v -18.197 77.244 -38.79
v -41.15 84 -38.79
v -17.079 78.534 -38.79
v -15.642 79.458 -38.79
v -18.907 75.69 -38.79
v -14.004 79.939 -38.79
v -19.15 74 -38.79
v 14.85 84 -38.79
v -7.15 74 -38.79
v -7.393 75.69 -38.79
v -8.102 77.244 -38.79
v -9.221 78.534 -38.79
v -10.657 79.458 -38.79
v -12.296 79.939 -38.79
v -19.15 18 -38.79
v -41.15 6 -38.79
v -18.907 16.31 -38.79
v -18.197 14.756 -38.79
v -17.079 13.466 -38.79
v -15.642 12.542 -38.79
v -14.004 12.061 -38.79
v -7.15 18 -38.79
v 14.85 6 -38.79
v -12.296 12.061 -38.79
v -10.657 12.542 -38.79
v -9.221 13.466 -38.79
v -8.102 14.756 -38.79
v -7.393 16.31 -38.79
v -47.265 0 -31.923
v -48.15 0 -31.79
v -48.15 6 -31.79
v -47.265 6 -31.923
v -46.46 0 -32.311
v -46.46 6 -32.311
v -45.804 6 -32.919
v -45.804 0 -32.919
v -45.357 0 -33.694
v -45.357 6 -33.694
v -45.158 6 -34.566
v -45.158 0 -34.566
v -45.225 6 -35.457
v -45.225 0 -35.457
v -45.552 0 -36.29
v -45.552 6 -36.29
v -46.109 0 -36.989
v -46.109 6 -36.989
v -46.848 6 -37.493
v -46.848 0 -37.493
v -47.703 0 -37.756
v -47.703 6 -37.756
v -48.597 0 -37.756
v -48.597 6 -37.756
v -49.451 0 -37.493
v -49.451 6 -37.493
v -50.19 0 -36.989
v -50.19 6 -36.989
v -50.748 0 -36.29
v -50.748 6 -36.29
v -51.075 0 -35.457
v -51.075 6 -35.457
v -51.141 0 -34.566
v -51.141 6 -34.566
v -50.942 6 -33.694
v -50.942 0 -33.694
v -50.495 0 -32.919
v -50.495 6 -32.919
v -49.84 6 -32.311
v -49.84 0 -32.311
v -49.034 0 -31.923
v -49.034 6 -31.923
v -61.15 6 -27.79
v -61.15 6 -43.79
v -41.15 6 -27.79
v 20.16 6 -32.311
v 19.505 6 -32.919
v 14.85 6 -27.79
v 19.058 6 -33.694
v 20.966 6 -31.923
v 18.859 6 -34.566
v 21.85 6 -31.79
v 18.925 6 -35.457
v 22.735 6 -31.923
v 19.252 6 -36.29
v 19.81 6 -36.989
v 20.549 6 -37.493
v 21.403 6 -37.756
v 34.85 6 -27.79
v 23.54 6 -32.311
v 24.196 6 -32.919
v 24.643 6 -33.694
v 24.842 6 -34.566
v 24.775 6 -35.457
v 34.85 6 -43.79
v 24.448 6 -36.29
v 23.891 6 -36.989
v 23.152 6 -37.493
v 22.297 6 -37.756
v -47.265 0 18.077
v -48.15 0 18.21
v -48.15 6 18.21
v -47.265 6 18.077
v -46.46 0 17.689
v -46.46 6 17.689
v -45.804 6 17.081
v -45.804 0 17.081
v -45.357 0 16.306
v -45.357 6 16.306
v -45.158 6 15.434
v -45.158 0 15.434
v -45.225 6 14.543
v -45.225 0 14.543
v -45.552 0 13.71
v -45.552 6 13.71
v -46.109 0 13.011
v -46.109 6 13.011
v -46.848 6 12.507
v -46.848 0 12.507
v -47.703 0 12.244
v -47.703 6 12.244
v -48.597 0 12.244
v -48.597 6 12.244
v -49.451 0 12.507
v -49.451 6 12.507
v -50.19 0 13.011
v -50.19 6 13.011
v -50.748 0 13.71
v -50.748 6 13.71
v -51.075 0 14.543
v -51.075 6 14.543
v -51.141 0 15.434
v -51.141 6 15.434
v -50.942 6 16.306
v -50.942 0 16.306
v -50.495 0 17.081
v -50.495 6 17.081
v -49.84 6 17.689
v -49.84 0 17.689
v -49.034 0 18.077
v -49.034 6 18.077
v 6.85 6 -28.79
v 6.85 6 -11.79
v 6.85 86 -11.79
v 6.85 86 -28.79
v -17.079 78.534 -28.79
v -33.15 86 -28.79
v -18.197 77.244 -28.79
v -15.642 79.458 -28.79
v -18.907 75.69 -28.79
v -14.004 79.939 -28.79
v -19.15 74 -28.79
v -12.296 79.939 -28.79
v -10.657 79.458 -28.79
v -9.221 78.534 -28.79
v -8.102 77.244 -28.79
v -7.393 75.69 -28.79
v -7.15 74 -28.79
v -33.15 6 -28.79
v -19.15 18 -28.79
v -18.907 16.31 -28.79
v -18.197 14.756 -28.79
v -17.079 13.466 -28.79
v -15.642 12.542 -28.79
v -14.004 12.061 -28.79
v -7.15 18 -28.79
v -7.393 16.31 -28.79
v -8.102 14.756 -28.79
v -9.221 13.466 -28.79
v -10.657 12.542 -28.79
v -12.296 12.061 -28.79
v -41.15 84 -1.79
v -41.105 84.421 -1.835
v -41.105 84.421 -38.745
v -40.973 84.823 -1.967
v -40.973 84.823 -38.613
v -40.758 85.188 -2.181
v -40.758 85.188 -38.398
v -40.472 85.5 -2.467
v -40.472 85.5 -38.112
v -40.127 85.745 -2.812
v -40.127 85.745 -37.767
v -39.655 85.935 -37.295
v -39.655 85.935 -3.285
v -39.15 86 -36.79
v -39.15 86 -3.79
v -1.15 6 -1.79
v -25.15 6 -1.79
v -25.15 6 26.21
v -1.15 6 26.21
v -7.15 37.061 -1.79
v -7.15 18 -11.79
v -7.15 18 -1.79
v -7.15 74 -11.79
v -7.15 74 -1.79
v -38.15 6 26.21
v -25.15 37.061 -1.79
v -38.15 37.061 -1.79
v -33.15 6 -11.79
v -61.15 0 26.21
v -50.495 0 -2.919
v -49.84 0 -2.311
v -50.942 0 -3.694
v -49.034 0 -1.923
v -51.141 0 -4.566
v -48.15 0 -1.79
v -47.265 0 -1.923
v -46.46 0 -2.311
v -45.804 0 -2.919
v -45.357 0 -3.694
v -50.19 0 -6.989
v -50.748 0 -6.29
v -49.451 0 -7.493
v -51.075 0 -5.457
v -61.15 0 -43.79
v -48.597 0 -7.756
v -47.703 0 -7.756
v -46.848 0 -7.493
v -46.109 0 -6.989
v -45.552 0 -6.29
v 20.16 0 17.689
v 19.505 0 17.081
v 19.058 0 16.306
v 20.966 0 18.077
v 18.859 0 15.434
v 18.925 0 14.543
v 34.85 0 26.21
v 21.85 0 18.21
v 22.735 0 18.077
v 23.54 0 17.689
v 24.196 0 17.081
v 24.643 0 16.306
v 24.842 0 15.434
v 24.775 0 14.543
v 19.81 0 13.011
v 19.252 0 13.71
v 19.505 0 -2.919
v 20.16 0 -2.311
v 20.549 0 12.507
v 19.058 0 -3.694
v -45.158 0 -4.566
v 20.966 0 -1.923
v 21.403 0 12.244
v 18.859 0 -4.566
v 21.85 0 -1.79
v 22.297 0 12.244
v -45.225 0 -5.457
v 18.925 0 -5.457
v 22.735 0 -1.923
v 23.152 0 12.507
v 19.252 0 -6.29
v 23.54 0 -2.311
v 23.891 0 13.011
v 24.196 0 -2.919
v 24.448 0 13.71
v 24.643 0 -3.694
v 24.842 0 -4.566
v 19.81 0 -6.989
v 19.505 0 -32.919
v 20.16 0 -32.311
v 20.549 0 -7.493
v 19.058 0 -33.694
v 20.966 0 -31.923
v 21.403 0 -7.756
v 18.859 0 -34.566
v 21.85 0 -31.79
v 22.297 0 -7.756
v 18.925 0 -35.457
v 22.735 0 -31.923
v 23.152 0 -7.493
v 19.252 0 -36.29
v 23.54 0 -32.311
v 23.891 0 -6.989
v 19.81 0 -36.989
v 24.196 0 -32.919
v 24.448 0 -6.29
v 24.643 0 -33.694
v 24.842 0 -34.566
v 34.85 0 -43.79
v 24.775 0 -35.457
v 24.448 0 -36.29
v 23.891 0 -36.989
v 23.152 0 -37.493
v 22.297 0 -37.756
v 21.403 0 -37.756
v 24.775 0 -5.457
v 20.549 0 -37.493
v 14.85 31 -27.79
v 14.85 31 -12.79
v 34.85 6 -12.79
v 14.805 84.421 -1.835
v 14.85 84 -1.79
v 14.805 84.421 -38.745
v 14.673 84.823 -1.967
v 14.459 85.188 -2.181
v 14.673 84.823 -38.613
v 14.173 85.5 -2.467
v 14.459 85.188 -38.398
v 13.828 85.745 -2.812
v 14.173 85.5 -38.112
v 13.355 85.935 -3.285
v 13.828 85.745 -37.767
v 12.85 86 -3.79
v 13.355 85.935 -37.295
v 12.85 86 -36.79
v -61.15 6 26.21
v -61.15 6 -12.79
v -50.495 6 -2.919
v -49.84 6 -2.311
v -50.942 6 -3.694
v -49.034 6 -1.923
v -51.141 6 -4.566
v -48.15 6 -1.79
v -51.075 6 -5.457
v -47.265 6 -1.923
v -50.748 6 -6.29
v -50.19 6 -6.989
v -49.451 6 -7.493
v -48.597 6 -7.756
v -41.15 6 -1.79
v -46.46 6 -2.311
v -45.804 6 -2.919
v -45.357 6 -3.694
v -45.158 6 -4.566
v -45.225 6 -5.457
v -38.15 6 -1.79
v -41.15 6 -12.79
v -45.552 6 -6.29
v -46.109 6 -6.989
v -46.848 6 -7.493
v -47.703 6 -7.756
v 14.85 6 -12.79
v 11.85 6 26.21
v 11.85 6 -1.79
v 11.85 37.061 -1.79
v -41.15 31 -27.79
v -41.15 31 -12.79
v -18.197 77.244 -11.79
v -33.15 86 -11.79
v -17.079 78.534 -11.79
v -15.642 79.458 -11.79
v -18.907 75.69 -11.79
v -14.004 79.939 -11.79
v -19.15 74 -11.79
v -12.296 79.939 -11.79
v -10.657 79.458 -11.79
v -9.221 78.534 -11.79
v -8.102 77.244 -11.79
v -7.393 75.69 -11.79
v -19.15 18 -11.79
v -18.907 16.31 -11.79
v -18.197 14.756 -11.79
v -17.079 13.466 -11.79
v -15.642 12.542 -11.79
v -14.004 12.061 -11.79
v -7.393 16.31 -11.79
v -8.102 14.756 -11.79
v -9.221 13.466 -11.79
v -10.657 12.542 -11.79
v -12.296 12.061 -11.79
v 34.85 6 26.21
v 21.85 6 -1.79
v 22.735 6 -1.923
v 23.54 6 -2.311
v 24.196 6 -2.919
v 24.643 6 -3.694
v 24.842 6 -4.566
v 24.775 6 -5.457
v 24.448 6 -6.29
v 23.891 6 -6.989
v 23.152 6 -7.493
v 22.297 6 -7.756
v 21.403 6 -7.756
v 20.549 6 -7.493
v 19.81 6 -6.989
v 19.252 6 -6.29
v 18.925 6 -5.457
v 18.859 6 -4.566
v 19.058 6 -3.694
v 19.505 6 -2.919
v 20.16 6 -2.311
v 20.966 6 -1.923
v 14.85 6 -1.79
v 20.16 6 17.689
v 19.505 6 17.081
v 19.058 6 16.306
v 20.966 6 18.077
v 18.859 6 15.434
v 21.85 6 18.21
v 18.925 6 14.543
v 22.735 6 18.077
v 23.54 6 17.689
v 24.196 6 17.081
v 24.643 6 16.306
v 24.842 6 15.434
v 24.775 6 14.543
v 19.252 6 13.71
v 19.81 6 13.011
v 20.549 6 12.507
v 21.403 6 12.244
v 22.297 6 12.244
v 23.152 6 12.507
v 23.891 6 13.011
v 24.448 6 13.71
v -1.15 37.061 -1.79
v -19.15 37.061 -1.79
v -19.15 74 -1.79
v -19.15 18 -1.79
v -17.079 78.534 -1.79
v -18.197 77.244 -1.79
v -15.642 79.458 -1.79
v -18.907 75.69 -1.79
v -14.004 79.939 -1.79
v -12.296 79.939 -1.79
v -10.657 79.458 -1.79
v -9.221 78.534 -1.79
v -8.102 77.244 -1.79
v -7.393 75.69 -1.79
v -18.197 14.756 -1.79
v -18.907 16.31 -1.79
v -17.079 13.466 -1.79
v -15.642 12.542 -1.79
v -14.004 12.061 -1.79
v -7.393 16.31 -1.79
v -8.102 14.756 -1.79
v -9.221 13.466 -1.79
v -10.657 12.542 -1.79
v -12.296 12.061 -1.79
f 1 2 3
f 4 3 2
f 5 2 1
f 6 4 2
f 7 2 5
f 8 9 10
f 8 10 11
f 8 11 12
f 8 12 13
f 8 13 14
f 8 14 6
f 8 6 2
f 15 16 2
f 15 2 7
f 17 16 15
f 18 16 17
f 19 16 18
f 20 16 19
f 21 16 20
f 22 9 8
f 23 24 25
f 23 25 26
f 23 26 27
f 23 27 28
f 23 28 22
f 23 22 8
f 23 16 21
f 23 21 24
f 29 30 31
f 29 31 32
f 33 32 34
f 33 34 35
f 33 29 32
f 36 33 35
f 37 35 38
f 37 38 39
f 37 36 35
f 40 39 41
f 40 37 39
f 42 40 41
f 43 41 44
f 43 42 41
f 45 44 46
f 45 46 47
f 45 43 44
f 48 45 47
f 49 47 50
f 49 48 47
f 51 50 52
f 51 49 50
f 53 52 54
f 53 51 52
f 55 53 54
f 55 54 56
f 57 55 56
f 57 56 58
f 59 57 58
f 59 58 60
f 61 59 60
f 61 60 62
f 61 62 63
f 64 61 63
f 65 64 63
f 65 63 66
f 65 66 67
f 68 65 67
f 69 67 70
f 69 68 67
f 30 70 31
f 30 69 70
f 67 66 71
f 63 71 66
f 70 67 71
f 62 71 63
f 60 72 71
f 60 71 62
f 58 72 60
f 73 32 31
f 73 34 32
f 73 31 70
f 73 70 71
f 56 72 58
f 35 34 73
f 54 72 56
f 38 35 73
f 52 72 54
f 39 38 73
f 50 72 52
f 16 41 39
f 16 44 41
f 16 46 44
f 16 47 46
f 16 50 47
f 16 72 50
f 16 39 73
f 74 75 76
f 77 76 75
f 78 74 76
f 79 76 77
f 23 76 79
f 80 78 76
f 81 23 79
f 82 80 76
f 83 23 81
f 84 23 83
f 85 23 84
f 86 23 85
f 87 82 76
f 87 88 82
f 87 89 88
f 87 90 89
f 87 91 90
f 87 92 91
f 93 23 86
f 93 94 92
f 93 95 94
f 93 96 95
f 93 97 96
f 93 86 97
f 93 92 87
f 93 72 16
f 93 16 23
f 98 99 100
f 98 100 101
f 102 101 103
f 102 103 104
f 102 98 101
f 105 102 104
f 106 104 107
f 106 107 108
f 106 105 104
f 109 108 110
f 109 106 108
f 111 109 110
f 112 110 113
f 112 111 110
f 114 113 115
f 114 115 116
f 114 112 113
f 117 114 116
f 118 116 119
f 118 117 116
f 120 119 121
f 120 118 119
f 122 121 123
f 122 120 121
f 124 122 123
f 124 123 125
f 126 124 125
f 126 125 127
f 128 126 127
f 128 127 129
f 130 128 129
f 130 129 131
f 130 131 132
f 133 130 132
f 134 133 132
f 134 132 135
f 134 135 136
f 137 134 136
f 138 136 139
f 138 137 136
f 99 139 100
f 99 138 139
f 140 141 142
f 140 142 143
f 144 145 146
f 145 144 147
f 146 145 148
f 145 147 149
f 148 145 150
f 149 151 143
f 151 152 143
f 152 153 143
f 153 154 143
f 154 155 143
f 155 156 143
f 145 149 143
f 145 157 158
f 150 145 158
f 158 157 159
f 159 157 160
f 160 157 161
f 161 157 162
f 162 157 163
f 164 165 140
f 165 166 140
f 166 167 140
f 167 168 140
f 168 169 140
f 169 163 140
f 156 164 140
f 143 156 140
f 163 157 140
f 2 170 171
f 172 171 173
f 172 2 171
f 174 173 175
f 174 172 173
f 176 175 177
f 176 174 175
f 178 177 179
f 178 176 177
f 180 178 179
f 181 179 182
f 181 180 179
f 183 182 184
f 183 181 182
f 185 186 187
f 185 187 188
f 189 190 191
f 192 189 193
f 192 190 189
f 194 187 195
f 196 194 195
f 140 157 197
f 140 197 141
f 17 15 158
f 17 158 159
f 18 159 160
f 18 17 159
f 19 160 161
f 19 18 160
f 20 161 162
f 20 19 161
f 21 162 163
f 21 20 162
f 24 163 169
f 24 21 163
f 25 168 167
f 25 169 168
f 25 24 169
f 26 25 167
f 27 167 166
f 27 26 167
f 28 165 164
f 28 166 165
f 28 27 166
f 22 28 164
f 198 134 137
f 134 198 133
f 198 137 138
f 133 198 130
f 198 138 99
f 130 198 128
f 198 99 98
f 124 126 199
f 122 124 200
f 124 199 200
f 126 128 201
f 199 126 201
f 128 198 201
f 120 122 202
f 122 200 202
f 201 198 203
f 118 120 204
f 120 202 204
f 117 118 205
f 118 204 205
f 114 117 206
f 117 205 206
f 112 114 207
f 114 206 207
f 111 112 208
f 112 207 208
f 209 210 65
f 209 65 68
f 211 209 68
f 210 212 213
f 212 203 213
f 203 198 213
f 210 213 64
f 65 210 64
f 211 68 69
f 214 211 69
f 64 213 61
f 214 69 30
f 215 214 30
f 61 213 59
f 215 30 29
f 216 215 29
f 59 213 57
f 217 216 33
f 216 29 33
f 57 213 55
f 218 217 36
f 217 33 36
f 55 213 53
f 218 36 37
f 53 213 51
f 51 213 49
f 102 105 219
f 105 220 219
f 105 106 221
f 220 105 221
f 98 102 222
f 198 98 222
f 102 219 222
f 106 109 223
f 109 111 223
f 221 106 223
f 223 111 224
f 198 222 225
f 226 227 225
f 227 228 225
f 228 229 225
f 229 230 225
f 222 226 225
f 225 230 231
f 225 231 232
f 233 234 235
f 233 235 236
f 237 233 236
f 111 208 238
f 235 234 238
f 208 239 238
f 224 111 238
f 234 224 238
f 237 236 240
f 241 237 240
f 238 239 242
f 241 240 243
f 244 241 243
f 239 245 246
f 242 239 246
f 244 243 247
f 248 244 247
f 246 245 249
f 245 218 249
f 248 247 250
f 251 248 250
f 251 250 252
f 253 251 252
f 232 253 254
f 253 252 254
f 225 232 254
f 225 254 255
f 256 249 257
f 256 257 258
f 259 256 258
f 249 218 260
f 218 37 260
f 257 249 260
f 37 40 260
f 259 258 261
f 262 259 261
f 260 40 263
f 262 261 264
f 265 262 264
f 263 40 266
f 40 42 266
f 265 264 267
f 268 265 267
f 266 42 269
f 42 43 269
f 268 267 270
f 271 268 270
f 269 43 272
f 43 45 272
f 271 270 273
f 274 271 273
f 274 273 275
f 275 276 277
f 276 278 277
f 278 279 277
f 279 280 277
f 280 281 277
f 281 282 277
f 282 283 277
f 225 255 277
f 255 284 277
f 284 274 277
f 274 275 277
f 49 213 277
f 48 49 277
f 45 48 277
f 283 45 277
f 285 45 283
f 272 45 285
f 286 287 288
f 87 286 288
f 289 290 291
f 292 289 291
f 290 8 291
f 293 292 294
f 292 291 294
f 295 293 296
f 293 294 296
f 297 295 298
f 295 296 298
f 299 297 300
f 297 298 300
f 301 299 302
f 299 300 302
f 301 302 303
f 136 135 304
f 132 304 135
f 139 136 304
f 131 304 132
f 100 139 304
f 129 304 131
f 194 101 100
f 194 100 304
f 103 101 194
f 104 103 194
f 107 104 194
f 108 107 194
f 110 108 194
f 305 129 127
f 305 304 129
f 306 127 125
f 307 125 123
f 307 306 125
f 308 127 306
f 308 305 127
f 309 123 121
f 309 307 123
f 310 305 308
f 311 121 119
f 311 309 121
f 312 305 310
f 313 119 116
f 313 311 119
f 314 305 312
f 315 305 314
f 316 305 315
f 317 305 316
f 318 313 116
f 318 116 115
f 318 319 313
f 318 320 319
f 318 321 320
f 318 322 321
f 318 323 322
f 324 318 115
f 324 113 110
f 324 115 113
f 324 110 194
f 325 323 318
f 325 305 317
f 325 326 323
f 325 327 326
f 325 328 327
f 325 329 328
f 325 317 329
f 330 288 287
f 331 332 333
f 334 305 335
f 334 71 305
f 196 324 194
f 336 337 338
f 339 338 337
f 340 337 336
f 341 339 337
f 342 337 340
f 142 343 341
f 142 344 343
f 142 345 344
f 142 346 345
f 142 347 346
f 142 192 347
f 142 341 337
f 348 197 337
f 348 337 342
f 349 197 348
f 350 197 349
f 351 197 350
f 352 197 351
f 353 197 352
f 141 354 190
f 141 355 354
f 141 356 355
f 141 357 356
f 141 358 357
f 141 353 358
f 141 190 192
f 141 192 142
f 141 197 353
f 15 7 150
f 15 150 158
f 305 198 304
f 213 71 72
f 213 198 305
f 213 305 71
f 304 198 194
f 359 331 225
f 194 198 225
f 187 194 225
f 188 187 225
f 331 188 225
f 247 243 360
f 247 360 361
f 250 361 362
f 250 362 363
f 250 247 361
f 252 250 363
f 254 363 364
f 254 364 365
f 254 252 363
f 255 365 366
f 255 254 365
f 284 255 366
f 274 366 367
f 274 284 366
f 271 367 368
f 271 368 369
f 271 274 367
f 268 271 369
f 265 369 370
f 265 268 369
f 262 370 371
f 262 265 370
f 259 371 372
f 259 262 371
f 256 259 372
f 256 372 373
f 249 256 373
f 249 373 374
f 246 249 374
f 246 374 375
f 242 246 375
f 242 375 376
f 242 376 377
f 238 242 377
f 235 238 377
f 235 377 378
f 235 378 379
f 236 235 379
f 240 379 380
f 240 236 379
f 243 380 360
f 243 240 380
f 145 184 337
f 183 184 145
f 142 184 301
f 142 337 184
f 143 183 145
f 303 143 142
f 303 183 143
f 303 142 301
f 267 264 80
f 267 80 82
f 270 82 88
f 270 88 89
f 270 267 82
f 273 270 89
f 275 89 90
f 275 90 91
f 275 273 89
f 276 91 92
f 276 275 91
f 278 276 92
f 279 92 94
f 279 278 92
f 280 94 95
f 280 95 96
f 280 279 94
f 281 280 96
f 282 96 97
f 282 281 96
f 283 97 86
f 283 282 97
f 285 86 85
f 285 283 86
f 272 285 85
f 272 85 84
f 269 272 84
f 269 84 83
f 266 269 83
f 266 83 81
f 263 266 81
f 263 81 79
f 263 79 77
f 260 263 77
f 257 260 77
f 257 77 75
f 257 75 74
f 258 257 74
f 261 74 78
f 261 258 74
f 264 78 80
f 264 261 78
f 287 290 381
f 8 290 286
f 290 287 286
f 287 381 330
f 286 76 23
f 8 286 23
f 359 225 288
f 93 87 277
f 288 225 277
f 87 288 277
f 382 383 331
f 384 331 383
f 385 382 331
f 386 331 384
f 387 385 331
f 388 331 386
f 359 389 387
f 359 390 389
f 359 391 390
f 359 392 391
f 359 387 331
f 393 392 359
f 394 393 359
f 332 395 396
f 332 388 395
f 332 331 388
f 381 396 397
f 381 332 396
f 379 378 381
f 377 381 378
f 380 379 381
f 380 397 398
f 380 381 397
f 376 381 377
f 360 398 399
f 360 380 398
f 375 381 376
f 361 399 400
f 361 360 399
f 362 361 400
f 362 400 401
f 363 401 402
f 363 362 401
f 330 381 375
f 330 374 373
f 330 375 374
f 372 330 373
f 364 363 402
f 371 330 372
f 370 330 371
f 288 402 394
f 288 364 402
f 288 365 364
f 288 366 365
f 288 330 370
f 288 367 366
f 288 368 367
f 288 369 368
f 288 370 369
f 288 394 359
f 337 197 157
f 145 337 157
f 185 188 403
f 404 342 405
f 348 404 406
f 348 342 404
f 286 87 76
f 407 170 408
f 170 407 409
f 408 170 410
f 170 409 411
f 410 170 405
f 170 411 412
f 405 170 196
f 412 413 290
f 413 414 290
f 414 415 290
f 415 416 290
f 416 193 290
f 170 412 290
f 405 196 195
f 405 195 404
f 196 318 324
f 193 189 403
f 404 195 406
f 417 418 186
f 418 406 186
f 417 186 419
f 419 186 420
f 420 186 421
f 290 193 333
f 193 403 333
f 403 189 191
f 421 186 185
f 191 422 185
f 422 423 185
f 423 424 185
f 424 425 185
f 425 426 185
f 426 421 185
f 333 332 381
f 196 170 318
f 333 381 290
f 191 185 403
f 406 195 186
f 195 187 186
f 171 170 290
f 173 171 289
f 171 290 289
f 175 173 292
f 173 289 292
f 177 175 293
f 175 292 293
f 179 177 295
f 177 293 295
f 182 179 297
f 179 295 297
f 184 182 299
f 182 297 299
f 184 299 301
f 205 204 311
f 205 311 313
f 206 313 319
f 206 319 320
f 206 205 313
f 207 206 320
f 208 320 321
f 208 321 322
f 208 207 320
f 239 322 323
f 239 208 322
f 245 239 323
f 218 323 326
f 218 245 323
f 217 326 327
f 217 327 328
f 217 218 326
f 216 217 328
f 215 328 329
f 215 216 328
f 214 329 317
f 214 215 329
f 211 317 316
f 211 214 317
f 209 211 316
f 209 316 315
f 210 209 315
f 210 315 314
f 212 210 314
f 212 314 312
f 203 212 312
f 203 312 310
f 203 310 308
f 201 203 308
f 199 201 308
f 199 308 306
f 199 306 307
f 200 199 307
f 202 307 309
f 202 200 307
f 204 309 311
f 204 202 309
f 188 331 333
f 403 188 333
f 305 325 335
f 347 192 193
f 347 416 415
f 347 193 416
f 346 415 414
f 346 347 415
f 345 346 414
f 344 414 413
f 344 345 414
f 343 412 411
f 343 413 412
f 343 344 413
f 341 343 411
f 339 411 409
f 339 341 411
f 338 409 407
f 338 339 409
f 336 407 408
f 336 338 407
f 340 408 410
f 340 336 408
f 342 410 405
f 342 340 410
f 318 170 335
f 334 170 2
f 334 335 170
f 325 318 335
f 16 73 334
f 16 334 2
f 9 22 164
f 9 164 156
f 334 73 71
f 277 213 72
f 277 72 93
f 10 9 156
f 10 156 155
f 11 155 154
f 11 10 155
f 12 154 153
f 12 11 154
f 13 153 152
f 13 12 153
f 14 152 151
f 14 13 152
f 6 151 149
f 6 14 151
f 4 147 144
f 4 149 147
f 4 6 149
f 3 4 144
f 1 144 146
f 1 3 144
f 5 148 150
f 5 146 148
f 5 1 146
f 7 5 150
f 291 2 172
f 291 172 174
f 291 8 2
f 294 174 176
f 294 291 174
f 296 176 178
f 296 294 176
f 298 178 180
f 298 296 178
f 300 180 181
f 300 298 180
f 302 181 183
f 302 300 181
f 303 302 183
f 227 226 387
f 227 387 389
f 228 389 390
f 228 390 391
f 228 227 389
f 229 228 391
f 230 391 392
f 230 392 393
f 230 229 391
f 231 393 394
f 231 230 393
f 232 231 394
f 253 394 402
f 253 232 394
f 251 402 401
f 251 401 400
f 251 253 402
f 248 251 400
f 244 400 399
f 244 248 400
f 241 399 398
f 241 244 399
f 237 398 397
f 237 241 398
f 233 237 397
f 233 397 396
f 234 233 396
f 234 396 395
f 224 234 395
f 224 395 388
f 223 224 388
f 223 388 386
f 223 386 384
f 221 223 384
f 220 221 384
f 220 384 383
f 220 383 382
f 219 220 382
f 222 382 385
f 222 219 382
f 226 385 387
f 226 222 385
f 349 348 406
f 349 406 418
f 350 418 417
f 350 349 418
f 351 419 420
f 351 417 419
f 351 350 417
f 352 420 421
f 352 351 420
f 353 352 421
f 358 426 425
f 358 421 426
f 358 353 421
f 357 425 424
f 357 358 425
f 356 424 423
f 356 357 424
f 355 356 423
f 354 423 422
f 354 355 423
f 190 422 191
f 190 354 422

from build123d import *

# Parameters (mm, degrees)
SKETCH_1_W          = 96
SKETCH_1_H          = 70
SKETCH_1_R          = 3
EXTRUDE_1_DEPTH     = 6
SKETCH_2_W          = 56
SKETCH_2_H          = 37
SKETCH_2_W_2        = 40
SKETCH_2_H_2        = 17
EXTRUDE_2_DEPTH     = 80
EXTRUDE_3_DEPTH     = 7.5
EXTRUDE_4_DEPTH     = 25
CUT_EXTRUDE_1_DEPTH = 124.93663618
SKETCH_10_W         = 24
SKETCH_10_H         = 30.908347595
CUT_EXTRUDE_2_DEPTH = 80
FILLET_1_R          = 2


with BuildPart() as part:
    # 草图1 → 凸台-拉伸1 (new body)
    with BuildSketch(Plane(origin=(0, 0, 0), x_dir=(1, 0, 0), z_dir=(0, 1, 0))):
        with Locations((-13.149732523, 8.78973091)):
            Rectangle(SKETCH_1_W, SKETCH_1_H)
        with Locations(Location((21.850267477, 4.78973091, 0), (0, 0, 270))):
            Circle(SKETCH_1_R, mode=Mode.SUBTRACT)
        with Locations(Location((-48.149732523, 4.78973091, 0), (0, 0, 270))):
            Circle(SKETCH_1_R, mode=Mode.SUBTRACT)
        with Locations(Location((21.850267477, -15.21026909, 0), (0, 0, 270))):
            Circle(SKETCH_1_R, mode=Mode.SUBTRACT)
        with Locations(Location((-48.149732523, -15.21026909, 0), (0, 0, 270))):
            Circle(SKETCH_1_R, mode=Mode.SUBTRACT)
        with Locations(Location((21.850267477, 34.78973091, 0), (0, 0, 270))):
            Circle(SKETCH_1_R, mode=Mode.SUBTRACT)
        with Locations(Location((-48.149732523, 34.78973091, 0), (0, 0, 270))):
            Circle(SKETCH_1_R, mode=Mode.SUBTRACT)
    extrude(amount=EXTRUDE_1_DEPTH)

    # 草图2 → 凸台-拉伸2 (add)
    with BuildSketch(Plane(origin=(0, 6, 0), x_dir=(1, 0, 0), z_dir=(0, 1, 0))):
        with Locations((-13.149732523, 20.28973091)):
            Rectangle(SKETCH_2_W, SKETCH_2_H)
        with Locations((-13.149732523, 20.28973091)):
            Rectangle(SKETCH_2_W_2, SKETCH_2_H_2, mode=Mode.SUBTRACT)
    extrude(amount=EXTRUDE_2_DEPTH)

    # 草图5 → 凸台-拉伸3 (add, symmetric)
    with BuildSketch(Plane.XY.offset(-20.28973091)):
        Polygon((-61.149732523, 6), (-41.149732523, 31), (-41.149732523, 6), align=None)
        Polygon((14.850267477, 31), (34.850267477, 6), (14.850267477, 6), align=None)
    extrude(amount=EXTRUDE_3_DEPTH, both=True)

    # 草图8 → 凸台-拉伸4 (add, symmetric)
    with BuildSketch(Plane(origin=(-13.149732523, 0, 0), x_dir=(0, 0, -1), z_dir=(1, 0, 0))):
        Polygon((-26.21026909, 6), (1.78973091, 37.060621439), (1.78973091, 6), align=None)
    extrude(amount=EXTRUDE_4_DEPTH, both=True)

    # 草图9 → 切除-拉伸1 (cut, through all)
    with BuildSketch(Plane(origin=(0, 0, -38.78973091), x_dir=(-1, 0, 0), z_dir=(0, 0, -1))):
        with BuildLine():
            Line((19.149732523, 74), (19.149732523, 18))
            ThreePointArc((19.149732523, 18), (13.149732523, 12), (7.149732523, 18))
            Line((7.149732523, 18), (7.149732523, 74))
            ThreePointArc((7.149732523, 74), (13.149732523, 80), (19.149732523, 74))
        make_face()
    extrude(amount=-CUT_EXTRUDE_1_DEPTH, mode=Mode.SUBTRACT)

    # 草图10 → 切除-拉伸2 (cut)
    with BuildSketch(Plane(origin=(0, 86, 0), x_dir=(1, 0, 0), z_dir=(0, 1, 0))):
        with Locations((-13.149732523, -13.664442888)):
            Rectangle(SKETCH_10_W, SKETCH_10_H)
    extrude(amount=-CUT_EXTRUDE_2_DEPTH, mode=Mode.SUBTRACT)

    # 圆角1
    fillet_1_edges = [part.edges().sort_by_distance(p)[0] for p in [
        (14.850267477, 86, -20.28973091),
        (-13.149732523, 86, -38.78973091),
        (-41.149732523, 86, -20.28973091),
        (-13.149732523, 86, -1.78973091),
    ]]
    fillet(fillet_1_edges, radius=FILLET_1_R)


solid = part.part
